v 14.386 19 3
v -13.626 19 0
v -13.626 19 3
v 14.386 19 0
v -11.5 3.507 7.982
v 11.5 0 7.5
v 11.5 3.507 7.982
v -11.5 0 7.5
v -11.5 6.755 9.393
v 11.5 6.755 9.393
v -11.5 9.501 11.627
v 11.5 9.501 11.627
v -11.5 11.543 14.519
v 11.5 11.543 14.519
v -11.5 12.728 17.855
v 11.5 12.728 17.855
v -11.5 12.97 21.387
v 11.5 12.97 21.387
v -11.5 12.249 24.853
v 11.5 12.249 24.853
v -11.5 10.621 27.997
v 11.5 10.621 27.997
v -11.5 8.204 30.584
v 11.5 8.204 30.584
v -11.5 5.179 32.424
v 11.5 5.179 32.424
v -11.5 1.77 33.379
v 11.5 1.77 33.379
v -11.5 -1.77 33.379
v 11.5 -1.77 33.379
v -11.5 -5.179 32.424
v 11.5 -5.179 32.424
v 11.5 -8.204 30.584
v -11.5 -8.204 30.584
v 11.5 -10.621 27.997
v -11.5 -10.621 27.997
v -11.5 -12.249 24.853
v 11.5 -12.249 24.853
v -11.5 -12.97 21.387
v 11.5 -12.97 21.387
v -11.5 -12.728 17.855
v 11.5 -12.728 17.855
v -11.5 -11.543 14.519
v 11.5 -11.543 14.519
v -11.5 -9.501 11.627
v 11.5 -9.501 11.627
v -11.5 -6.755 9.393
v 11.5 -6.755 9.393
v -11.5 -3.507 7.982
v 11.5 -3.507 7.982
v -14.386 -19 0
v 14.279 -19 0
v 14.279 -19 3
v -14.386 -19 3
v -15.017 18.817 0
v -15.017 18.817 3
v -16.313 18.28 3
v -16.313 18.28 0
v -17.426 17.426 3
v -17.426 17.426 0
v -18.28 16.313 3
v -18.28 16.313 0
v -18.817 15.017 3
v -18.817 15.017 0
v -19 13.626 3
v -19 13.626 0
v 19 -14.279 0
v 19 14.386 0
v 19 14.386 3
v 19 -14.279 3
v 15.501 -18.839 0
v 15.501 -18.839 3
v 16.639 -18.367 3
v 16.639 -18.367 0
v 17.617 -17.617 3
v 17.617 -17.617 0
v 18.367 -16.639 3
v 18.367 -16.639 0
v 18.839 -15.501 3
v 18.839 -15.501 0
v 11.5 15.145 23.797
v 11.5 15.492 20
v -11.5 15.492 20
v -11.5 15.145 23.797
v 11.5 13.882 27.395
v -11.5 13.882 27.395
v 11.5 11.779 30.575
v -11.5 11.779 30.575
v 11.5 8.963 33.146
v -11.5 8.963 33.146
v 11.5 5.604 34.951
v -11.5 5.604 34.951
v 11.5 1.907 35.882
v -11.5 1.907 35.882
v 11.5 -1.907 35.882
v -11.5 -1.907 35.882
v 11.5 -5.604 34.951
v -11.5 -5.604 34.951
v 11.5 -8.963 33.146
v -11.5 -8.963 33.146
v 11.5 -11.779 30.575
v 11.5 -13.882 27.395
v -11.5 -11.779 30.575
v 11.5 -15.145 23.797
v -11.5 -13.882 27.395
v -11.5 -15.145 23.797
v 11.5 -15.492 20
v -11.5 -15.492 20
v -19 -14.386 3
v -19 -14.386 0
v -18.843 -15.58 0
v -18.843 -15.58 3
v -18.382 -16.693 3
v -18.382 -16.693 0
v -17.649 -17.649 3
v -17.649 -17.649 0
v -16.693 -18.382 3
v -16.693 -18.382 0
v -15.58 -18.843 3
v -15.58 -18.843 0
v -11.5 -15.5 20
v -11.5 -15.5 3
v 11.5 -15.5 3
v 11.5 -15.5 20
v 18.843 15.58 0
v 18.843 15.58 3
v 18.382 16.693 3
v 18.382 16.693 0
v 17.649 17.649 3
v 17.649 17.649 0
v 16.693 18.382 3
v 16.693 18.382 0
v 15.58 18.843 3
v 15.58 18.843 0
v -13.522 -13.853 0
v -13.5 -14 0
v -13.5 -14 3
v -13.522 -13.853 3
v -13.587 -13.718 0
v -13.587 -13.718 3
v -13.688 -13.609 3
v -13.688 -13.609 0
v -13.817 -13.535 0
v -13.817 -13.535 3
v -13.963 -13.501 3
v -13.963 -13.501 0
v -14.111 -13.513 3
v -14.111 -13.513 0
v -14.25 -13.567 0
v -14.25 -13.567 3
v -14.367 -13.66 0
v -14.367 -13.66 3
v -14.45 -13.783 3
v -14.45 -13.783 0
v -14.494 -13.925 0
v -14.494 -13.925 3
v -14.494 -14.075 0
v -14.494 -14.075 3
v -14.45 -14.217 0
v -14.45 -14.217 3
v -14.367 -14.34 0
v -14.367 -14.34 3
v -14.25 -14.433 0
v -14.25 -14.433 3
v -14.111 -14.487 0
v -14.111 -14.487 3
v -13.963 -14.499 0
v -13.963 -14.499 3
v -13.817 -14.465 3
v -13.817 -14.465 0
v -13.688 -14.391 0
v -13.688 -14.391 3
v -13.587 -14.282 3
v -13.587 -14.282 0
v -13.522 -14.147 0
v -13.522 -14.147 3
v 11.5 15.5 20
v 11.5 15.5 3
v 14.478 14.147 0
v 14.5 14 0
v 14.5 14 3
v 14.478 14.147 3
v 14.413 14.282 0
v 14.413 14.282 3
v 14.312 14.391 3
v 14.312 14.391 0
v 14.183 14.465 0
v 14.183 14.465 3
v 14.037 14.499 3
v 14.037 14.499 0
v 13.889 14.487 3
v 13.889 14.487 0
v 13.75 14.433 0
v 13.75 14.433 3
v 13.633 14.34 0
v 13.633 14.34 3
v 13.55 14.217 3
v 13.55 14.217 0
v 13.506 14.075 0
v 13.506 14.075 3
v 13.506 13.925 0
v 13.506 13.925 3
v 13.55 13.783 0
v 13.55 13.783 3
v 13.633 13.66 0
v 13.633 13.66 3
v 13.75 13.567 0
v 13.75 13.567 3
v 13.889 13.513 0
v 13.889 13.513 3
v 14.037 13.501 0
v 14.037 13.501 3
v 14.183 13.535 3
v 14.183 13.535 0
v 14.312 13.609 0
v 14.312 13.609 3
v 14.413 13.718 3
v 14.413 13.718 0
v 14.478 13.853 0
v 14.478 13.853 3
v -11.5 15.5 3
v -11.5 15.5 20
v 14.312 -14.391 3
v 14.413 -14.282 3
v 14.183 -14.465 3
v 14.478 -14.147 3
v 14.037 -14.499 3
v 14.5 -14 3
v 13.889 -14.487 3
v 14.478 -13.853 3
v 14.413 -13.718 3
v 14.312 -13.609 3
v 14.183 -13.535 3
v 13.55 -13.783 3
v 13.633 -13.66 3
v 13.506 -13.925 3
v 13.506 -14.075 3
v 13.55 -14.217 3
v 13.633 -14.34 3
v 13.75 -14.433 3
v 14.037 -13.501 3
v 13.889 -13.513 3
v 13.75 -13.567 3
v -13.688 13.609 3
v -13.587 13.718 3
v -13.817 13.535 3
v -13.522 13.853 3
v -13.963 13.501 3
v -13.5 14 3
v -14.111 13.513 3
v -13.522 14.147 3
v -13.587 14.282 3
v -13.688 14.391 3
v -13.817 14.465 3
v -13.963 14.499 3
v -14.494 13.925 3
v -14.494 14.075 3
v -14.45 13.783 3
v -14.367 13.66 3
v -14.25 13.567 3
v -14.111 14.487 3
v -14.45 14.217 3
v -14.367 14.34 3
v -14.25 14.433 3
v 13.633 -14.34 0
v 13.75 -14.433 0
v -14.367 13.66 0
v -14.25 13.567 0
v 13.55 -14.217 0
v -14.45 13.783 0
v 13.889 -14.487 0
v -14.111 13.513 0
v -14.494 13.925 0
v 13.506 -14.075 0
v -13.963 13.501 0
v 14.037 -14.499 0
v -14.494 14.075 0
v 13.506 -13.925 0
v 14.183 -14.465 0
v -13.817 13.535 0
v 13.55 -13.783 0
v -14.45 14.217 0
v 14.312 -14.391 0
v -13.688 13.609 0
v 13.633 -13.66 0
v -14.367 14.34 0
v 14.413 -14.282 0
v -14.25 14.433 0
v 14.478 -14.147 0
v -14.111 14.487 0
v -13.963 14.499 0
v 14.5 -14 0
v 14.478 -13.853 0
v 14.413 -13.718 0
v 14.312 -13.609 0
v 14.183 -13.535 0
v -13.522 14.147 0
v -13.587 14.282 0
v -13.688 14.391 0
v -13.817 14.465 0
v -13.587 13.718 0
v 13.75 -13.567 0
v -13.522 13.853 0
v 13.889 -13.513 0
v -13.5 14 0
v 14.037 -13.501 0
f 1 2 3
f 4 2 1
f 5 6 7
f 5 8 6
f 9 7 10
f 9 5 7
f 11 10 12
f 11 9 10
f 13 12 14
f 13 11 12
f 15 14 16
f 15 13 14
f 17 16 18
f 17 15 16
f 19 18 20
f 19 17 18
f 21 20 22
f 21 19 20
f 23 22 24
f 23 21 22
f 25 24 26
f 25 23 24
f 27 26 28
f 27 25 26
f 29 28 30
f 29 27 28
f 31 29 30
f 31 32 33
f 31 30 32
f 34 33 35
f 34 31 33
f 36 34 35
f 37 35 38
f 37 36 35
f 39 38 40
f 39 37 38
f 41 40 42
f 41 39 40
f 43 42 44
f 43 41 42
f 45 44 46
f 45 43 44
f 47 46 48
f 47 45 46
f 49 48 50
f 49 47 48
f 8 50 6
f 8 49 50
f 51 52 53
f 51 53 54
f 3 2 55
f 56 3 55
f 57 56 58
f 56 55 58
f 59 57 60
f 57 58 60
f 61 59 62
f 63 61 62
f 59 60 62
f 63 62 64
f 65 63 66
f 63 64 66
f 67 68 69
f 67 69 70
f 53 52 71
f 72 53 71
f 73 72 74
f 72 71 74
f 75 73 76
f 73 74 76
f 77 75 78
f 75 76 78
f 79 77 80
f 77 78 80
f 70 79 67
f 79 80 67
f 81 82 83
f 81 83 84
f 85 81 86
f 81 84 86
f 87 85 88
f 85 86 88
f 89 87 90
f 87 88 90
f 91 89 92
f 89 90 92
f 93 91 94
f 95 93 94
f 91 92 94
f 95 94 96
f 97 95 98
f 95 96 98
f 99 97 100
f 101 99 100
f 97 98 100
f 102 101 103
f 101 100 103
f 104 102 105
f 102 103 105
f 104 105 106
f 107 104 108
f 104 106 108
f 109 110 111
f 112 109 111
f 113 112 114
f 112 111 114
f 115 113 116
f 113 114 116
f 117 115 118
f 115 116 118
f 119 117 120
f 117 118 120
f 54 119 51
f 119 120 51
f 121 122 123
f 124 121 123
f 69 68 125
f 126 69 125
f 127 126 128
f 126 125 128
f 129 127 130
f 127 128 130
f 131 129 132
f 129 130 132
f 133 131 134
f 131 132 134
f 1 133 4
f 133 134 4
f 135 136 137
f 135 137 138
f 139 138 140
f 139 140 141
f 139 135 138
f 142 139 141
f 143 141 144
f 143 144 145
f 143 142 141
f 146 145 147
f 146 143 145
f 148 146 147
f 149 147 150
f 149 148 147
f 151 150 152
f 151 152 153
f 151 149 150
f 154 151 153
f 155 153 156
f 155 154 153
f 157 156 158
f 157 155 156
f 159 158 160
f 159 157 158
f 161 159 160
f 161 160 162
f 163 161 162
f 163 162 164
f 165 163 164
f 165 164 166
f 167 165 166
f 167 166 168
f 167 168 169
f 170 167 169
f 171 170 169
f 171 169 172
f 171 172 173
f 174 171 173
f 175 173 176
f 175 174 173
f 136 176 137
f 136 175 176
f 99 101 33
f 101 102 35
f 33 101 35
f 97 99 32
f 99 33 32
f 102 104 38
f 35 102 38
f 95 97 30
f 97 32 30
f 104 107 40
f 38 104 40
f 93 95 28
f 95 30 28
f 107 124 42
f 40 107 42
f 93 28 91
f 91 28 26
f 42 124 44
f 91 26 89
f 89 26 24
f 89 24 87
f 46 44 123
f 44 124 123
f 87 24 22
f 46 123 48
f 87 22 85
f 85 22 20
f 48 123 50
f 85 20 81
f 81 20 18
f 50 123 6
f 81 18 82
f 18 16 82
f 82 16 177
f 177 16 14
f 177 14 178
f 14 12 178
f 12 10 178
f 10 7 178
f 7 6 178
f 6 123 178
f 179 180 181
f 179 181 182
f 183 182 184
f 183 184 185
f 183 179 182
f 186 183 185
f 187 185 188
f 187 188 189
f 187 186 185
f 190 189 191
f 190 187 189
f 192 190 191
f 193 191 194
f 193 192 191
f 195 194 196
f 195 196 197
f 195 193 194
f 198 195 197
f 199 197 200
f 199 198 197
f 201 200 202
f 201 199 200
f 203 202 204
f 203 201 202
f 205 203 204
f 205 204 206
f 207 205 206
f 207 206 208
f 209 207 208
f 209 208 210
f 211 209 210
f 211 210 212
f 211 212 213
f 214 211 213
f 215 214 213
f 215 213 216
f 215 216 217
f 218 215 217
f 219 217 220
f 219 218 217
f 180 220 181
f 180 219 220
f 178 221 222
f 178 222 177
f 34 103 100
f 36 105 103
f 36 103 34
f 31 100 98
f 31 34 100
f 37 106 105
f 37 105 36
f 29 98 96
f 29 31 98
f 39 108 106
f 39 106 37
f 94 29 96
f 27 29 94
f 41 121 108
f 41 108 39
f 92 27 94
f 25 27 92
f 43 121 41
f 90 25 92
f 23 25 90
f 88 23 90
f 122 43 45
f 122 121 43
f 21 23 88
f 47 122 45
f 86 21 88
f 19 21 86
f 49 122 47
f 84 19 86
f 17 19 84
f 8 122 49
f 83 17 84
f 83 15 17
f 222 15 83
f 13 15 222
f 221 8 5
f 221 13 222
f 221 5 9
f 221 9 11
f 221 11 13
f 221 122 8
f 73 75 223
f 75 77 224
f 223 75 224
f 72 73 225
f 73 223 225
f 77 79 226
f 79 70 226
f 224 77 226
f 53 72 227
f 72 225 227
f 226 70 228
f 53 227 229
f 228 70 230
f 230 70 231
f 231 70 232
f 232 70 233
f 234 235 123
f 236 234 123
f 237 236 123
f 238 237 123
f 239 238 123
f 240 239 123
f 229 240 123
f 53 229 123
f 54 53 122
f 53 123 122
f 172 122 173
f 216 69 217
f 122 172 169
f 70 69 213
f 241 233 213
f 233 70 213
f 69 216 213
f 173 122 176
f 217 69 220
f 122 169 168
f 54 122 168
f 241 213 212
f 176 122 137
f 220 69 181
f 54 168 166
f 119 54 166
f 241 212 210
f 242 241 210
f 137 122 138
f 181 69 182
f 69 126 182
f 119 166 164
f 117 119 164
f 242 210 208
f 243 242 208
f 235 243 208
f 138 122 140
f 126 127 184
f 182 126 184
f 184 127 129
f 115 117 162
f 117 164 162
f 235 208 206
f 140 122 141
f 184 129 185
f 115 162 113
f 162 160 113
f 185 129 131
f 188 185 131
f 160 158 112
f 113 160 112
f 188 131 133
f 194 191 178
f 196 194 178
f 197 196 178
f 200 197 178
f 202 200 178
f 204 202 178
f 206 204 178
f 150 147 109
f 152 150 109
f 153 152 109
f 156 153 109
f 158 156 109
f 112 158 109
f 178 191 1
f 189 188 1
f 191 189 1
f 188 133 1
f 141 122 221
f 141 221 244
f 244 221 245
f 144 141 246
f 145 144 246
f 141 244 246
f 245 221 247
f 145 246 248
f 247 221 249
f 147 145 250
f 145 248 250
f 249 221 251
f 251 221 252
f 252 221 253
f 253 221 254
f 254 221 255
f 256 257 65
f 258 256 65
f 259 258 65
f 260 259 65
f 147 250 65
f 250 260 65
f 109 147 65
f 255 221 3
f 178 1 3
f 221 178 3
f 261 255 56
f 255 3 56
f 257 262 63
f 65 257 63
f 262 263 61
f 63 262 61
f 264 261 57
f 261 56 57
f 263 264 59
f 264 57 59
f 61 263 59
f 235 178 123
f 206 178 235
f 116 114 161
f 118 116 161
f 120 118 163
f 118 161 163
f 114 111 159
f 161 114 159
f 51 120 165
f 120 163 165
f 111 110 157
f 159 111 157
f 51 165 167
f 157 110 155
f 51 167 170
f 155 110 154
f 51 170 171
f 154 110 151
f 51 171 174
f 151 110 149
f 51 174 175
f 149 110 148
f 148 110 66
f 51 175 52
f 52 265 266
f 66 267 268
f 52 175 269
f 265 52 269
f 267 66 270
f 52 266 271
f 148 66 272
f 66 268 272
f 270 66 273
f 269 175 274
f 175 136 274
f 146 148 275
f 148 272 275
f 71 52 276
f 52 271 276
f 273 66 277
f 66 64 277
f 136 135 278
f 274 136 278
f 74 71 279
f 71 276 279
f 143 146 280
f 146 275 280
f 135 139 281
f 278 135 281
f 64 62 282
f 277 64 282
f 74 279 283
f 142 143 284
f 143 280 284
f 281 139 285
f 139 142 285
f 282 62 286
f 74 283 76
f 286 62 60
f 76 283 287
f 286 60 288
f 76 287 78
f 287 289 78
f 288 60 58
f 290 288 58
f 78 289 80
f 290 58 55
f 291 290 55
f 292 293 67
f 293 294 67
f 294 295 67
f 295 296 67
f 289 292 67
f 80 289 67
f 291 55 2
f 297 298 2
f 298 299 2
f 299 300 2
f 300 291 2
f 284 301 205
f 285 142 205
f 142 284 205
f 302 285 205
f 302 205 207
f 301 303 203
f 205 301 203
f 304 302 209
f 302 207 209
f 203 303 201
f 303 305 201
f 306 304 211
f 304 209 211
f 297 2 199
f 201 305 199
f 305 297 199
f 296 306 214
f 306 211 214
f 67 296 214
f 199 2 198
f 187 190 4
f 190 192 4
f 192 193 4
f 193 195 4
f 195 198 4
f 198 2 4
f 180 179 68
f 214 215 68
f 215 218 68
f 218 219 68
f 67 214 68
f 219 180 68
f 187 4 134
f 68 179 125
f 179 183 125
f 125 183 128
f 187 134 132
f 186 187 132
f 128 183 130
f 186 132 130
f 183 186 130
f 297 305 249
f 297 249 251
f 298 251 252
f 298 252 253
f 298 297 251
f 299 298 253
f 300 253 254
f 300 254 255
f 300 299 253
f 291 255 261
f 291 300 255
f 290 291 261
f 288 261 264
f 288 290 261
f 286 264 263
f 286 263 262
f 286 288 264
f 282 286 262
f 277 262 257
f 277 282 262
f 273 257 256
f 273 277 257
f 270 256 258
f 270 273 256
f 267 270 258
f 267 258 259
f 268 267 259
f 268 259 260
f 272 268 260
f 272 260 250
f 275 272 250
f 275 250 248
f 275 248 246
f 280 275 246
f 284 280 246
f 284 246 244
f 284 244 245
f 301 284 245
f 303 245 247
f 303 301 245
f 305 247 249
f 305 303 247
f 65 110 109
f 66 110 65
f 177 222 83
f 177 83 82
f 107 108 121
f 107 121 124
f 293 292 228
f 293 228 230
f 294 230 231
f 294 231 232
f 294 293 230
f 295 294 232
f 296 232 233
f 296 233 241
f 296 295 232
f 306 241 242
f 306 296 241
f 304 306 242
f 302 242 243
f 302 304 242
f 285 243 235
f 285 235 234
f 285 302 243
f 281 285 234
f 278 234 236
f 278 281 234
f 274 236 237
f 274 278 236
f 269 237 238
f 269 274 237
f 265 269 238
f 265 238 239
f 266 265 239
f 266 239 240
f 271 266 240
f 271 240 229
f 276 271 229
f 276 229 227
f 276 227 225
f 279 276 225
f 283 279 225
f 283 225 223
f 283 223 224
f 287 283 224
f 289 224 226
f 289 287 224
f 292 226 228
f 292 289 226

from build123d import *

# Parameters (mm, degrees)
CYLINDER023_R     = 13
CYLINDER023_DEPTH = 23
CYLINDER024_R     = 15.5
CYLINDER024_DEPTH = 23
CYLINDER025_R     = 13
CYLINDER025_DEPTH = 40
BOX001_W          = 23
BOX001_H          = 31
BOX001_DEPTH      = 20
SKETCH005_R       = 0.5
PAD004_DEPTH      = 3


with BuildPart() as cylinder023:
    # Cylinder023 → Cylinder023 (new body)
    with BuildSketch(Plane(origin=(0, 0, 7), x_dir=(0, 0, -1), z_dir=(1, 0, 0))):
        Circle(CYLINDER023_R)
    extrude(amount=CYLINDER023_DEPTH)


with BuildPart() as cut:
    # Cylinder024 → Cylinder024 (new body)
    with BuildSketch(Plane(origin=(0, 0, 7), x_dir=(0, 0, -1), z_dir=(1, 0, 0))):
        Circle(CYLINDER024_R)
    extrude(amount=CYLINDER024_DEPTH)

    # Cut: cut Cylinder023
    add(cylinder023.part, mode=Mode.SUBTRACT)


with BuildPart() as cut_1:
    # Cut placement: moved
    add(cut.part.moved(Location((-11.5, 0, 13.5))))


with BuildPart() as cylinder025:
    # Cylinder025 → Cylinder025 (new body)
    with BuildSketch(Plane(origin=(-17, 0, 20.5), x_dir=(0, 0, -1), z_dir=(1, 0, 0))):
        Circle(CYLINDER025_R)
    extrude(amount=CYLINDER025_DEPTH)


with BuildPart() as cut001:
    # Box001 → Box001 (new body)
    with BuildSketch(Plane(origin=(-11.5, -15.5, 0), x_dir=(1, 0, 0), z_dir=(0, 0, 1))):
        with Locations((11.5, 15.5)):
            Rectangle(BOX001_W, BOX001_H)
    extrude(amount=BOX001_DEPTH)

    # Cut001: cut Cylinder025
    add(cylinder025.part, mode=Mode.SUBTRACT)


with BuildPart() as f_52_raspcamsupportfixer:
    # Sketch005 → Pad004 (new body)
    with BuildSketch(Plane.XY):
        with BuildLine():
            Line((-13.625988, 19), (14.385989, 19))
            ThreePointArc((19, 14.385989), (17.648587, 17.648587), (14.385989, 19))
            Line((19, 14.385989), (19, -14.278508))
            ThreePointArc((14.278508, -19), (17.617107, -17.617107), (19, -14.278508))
            Line((14.278508, -19), (-14.385989, -19))
            ThreePointArc((-19, -14.385989), (-17.648587, -17.648587), (-14.385989, -19))
            Line((-19, -14.385989), (-19, 13.625988))
            ThreePointArc((-13.625988, 19), (-17.425988, 17.425988), (-19, 13.625988))
        make_face()
        with Locations((-14, 14)):
            Circle(SKETCH005_R, mode=Mode.SUBTRACT)
        with Locations((14, 14)):
            Circle(SKETCH005_R, mode=Mode.SUBTRACT)
        with Locations((14, -14)):
            Circle(SKETCH005_R, mode=Mode.SUBTRACT)
        with Locations((-14, -14)):
            Circle(SKETCH005_R, mode=Mode.SUBTRACT)
    extrude(amount=PAD004_DEPTH)

    # Fusion027: union Cut, Cut001
    add(cut_1.part)
    add(cut001.part)


solid = f_52_raspcamsupportfixer.part
